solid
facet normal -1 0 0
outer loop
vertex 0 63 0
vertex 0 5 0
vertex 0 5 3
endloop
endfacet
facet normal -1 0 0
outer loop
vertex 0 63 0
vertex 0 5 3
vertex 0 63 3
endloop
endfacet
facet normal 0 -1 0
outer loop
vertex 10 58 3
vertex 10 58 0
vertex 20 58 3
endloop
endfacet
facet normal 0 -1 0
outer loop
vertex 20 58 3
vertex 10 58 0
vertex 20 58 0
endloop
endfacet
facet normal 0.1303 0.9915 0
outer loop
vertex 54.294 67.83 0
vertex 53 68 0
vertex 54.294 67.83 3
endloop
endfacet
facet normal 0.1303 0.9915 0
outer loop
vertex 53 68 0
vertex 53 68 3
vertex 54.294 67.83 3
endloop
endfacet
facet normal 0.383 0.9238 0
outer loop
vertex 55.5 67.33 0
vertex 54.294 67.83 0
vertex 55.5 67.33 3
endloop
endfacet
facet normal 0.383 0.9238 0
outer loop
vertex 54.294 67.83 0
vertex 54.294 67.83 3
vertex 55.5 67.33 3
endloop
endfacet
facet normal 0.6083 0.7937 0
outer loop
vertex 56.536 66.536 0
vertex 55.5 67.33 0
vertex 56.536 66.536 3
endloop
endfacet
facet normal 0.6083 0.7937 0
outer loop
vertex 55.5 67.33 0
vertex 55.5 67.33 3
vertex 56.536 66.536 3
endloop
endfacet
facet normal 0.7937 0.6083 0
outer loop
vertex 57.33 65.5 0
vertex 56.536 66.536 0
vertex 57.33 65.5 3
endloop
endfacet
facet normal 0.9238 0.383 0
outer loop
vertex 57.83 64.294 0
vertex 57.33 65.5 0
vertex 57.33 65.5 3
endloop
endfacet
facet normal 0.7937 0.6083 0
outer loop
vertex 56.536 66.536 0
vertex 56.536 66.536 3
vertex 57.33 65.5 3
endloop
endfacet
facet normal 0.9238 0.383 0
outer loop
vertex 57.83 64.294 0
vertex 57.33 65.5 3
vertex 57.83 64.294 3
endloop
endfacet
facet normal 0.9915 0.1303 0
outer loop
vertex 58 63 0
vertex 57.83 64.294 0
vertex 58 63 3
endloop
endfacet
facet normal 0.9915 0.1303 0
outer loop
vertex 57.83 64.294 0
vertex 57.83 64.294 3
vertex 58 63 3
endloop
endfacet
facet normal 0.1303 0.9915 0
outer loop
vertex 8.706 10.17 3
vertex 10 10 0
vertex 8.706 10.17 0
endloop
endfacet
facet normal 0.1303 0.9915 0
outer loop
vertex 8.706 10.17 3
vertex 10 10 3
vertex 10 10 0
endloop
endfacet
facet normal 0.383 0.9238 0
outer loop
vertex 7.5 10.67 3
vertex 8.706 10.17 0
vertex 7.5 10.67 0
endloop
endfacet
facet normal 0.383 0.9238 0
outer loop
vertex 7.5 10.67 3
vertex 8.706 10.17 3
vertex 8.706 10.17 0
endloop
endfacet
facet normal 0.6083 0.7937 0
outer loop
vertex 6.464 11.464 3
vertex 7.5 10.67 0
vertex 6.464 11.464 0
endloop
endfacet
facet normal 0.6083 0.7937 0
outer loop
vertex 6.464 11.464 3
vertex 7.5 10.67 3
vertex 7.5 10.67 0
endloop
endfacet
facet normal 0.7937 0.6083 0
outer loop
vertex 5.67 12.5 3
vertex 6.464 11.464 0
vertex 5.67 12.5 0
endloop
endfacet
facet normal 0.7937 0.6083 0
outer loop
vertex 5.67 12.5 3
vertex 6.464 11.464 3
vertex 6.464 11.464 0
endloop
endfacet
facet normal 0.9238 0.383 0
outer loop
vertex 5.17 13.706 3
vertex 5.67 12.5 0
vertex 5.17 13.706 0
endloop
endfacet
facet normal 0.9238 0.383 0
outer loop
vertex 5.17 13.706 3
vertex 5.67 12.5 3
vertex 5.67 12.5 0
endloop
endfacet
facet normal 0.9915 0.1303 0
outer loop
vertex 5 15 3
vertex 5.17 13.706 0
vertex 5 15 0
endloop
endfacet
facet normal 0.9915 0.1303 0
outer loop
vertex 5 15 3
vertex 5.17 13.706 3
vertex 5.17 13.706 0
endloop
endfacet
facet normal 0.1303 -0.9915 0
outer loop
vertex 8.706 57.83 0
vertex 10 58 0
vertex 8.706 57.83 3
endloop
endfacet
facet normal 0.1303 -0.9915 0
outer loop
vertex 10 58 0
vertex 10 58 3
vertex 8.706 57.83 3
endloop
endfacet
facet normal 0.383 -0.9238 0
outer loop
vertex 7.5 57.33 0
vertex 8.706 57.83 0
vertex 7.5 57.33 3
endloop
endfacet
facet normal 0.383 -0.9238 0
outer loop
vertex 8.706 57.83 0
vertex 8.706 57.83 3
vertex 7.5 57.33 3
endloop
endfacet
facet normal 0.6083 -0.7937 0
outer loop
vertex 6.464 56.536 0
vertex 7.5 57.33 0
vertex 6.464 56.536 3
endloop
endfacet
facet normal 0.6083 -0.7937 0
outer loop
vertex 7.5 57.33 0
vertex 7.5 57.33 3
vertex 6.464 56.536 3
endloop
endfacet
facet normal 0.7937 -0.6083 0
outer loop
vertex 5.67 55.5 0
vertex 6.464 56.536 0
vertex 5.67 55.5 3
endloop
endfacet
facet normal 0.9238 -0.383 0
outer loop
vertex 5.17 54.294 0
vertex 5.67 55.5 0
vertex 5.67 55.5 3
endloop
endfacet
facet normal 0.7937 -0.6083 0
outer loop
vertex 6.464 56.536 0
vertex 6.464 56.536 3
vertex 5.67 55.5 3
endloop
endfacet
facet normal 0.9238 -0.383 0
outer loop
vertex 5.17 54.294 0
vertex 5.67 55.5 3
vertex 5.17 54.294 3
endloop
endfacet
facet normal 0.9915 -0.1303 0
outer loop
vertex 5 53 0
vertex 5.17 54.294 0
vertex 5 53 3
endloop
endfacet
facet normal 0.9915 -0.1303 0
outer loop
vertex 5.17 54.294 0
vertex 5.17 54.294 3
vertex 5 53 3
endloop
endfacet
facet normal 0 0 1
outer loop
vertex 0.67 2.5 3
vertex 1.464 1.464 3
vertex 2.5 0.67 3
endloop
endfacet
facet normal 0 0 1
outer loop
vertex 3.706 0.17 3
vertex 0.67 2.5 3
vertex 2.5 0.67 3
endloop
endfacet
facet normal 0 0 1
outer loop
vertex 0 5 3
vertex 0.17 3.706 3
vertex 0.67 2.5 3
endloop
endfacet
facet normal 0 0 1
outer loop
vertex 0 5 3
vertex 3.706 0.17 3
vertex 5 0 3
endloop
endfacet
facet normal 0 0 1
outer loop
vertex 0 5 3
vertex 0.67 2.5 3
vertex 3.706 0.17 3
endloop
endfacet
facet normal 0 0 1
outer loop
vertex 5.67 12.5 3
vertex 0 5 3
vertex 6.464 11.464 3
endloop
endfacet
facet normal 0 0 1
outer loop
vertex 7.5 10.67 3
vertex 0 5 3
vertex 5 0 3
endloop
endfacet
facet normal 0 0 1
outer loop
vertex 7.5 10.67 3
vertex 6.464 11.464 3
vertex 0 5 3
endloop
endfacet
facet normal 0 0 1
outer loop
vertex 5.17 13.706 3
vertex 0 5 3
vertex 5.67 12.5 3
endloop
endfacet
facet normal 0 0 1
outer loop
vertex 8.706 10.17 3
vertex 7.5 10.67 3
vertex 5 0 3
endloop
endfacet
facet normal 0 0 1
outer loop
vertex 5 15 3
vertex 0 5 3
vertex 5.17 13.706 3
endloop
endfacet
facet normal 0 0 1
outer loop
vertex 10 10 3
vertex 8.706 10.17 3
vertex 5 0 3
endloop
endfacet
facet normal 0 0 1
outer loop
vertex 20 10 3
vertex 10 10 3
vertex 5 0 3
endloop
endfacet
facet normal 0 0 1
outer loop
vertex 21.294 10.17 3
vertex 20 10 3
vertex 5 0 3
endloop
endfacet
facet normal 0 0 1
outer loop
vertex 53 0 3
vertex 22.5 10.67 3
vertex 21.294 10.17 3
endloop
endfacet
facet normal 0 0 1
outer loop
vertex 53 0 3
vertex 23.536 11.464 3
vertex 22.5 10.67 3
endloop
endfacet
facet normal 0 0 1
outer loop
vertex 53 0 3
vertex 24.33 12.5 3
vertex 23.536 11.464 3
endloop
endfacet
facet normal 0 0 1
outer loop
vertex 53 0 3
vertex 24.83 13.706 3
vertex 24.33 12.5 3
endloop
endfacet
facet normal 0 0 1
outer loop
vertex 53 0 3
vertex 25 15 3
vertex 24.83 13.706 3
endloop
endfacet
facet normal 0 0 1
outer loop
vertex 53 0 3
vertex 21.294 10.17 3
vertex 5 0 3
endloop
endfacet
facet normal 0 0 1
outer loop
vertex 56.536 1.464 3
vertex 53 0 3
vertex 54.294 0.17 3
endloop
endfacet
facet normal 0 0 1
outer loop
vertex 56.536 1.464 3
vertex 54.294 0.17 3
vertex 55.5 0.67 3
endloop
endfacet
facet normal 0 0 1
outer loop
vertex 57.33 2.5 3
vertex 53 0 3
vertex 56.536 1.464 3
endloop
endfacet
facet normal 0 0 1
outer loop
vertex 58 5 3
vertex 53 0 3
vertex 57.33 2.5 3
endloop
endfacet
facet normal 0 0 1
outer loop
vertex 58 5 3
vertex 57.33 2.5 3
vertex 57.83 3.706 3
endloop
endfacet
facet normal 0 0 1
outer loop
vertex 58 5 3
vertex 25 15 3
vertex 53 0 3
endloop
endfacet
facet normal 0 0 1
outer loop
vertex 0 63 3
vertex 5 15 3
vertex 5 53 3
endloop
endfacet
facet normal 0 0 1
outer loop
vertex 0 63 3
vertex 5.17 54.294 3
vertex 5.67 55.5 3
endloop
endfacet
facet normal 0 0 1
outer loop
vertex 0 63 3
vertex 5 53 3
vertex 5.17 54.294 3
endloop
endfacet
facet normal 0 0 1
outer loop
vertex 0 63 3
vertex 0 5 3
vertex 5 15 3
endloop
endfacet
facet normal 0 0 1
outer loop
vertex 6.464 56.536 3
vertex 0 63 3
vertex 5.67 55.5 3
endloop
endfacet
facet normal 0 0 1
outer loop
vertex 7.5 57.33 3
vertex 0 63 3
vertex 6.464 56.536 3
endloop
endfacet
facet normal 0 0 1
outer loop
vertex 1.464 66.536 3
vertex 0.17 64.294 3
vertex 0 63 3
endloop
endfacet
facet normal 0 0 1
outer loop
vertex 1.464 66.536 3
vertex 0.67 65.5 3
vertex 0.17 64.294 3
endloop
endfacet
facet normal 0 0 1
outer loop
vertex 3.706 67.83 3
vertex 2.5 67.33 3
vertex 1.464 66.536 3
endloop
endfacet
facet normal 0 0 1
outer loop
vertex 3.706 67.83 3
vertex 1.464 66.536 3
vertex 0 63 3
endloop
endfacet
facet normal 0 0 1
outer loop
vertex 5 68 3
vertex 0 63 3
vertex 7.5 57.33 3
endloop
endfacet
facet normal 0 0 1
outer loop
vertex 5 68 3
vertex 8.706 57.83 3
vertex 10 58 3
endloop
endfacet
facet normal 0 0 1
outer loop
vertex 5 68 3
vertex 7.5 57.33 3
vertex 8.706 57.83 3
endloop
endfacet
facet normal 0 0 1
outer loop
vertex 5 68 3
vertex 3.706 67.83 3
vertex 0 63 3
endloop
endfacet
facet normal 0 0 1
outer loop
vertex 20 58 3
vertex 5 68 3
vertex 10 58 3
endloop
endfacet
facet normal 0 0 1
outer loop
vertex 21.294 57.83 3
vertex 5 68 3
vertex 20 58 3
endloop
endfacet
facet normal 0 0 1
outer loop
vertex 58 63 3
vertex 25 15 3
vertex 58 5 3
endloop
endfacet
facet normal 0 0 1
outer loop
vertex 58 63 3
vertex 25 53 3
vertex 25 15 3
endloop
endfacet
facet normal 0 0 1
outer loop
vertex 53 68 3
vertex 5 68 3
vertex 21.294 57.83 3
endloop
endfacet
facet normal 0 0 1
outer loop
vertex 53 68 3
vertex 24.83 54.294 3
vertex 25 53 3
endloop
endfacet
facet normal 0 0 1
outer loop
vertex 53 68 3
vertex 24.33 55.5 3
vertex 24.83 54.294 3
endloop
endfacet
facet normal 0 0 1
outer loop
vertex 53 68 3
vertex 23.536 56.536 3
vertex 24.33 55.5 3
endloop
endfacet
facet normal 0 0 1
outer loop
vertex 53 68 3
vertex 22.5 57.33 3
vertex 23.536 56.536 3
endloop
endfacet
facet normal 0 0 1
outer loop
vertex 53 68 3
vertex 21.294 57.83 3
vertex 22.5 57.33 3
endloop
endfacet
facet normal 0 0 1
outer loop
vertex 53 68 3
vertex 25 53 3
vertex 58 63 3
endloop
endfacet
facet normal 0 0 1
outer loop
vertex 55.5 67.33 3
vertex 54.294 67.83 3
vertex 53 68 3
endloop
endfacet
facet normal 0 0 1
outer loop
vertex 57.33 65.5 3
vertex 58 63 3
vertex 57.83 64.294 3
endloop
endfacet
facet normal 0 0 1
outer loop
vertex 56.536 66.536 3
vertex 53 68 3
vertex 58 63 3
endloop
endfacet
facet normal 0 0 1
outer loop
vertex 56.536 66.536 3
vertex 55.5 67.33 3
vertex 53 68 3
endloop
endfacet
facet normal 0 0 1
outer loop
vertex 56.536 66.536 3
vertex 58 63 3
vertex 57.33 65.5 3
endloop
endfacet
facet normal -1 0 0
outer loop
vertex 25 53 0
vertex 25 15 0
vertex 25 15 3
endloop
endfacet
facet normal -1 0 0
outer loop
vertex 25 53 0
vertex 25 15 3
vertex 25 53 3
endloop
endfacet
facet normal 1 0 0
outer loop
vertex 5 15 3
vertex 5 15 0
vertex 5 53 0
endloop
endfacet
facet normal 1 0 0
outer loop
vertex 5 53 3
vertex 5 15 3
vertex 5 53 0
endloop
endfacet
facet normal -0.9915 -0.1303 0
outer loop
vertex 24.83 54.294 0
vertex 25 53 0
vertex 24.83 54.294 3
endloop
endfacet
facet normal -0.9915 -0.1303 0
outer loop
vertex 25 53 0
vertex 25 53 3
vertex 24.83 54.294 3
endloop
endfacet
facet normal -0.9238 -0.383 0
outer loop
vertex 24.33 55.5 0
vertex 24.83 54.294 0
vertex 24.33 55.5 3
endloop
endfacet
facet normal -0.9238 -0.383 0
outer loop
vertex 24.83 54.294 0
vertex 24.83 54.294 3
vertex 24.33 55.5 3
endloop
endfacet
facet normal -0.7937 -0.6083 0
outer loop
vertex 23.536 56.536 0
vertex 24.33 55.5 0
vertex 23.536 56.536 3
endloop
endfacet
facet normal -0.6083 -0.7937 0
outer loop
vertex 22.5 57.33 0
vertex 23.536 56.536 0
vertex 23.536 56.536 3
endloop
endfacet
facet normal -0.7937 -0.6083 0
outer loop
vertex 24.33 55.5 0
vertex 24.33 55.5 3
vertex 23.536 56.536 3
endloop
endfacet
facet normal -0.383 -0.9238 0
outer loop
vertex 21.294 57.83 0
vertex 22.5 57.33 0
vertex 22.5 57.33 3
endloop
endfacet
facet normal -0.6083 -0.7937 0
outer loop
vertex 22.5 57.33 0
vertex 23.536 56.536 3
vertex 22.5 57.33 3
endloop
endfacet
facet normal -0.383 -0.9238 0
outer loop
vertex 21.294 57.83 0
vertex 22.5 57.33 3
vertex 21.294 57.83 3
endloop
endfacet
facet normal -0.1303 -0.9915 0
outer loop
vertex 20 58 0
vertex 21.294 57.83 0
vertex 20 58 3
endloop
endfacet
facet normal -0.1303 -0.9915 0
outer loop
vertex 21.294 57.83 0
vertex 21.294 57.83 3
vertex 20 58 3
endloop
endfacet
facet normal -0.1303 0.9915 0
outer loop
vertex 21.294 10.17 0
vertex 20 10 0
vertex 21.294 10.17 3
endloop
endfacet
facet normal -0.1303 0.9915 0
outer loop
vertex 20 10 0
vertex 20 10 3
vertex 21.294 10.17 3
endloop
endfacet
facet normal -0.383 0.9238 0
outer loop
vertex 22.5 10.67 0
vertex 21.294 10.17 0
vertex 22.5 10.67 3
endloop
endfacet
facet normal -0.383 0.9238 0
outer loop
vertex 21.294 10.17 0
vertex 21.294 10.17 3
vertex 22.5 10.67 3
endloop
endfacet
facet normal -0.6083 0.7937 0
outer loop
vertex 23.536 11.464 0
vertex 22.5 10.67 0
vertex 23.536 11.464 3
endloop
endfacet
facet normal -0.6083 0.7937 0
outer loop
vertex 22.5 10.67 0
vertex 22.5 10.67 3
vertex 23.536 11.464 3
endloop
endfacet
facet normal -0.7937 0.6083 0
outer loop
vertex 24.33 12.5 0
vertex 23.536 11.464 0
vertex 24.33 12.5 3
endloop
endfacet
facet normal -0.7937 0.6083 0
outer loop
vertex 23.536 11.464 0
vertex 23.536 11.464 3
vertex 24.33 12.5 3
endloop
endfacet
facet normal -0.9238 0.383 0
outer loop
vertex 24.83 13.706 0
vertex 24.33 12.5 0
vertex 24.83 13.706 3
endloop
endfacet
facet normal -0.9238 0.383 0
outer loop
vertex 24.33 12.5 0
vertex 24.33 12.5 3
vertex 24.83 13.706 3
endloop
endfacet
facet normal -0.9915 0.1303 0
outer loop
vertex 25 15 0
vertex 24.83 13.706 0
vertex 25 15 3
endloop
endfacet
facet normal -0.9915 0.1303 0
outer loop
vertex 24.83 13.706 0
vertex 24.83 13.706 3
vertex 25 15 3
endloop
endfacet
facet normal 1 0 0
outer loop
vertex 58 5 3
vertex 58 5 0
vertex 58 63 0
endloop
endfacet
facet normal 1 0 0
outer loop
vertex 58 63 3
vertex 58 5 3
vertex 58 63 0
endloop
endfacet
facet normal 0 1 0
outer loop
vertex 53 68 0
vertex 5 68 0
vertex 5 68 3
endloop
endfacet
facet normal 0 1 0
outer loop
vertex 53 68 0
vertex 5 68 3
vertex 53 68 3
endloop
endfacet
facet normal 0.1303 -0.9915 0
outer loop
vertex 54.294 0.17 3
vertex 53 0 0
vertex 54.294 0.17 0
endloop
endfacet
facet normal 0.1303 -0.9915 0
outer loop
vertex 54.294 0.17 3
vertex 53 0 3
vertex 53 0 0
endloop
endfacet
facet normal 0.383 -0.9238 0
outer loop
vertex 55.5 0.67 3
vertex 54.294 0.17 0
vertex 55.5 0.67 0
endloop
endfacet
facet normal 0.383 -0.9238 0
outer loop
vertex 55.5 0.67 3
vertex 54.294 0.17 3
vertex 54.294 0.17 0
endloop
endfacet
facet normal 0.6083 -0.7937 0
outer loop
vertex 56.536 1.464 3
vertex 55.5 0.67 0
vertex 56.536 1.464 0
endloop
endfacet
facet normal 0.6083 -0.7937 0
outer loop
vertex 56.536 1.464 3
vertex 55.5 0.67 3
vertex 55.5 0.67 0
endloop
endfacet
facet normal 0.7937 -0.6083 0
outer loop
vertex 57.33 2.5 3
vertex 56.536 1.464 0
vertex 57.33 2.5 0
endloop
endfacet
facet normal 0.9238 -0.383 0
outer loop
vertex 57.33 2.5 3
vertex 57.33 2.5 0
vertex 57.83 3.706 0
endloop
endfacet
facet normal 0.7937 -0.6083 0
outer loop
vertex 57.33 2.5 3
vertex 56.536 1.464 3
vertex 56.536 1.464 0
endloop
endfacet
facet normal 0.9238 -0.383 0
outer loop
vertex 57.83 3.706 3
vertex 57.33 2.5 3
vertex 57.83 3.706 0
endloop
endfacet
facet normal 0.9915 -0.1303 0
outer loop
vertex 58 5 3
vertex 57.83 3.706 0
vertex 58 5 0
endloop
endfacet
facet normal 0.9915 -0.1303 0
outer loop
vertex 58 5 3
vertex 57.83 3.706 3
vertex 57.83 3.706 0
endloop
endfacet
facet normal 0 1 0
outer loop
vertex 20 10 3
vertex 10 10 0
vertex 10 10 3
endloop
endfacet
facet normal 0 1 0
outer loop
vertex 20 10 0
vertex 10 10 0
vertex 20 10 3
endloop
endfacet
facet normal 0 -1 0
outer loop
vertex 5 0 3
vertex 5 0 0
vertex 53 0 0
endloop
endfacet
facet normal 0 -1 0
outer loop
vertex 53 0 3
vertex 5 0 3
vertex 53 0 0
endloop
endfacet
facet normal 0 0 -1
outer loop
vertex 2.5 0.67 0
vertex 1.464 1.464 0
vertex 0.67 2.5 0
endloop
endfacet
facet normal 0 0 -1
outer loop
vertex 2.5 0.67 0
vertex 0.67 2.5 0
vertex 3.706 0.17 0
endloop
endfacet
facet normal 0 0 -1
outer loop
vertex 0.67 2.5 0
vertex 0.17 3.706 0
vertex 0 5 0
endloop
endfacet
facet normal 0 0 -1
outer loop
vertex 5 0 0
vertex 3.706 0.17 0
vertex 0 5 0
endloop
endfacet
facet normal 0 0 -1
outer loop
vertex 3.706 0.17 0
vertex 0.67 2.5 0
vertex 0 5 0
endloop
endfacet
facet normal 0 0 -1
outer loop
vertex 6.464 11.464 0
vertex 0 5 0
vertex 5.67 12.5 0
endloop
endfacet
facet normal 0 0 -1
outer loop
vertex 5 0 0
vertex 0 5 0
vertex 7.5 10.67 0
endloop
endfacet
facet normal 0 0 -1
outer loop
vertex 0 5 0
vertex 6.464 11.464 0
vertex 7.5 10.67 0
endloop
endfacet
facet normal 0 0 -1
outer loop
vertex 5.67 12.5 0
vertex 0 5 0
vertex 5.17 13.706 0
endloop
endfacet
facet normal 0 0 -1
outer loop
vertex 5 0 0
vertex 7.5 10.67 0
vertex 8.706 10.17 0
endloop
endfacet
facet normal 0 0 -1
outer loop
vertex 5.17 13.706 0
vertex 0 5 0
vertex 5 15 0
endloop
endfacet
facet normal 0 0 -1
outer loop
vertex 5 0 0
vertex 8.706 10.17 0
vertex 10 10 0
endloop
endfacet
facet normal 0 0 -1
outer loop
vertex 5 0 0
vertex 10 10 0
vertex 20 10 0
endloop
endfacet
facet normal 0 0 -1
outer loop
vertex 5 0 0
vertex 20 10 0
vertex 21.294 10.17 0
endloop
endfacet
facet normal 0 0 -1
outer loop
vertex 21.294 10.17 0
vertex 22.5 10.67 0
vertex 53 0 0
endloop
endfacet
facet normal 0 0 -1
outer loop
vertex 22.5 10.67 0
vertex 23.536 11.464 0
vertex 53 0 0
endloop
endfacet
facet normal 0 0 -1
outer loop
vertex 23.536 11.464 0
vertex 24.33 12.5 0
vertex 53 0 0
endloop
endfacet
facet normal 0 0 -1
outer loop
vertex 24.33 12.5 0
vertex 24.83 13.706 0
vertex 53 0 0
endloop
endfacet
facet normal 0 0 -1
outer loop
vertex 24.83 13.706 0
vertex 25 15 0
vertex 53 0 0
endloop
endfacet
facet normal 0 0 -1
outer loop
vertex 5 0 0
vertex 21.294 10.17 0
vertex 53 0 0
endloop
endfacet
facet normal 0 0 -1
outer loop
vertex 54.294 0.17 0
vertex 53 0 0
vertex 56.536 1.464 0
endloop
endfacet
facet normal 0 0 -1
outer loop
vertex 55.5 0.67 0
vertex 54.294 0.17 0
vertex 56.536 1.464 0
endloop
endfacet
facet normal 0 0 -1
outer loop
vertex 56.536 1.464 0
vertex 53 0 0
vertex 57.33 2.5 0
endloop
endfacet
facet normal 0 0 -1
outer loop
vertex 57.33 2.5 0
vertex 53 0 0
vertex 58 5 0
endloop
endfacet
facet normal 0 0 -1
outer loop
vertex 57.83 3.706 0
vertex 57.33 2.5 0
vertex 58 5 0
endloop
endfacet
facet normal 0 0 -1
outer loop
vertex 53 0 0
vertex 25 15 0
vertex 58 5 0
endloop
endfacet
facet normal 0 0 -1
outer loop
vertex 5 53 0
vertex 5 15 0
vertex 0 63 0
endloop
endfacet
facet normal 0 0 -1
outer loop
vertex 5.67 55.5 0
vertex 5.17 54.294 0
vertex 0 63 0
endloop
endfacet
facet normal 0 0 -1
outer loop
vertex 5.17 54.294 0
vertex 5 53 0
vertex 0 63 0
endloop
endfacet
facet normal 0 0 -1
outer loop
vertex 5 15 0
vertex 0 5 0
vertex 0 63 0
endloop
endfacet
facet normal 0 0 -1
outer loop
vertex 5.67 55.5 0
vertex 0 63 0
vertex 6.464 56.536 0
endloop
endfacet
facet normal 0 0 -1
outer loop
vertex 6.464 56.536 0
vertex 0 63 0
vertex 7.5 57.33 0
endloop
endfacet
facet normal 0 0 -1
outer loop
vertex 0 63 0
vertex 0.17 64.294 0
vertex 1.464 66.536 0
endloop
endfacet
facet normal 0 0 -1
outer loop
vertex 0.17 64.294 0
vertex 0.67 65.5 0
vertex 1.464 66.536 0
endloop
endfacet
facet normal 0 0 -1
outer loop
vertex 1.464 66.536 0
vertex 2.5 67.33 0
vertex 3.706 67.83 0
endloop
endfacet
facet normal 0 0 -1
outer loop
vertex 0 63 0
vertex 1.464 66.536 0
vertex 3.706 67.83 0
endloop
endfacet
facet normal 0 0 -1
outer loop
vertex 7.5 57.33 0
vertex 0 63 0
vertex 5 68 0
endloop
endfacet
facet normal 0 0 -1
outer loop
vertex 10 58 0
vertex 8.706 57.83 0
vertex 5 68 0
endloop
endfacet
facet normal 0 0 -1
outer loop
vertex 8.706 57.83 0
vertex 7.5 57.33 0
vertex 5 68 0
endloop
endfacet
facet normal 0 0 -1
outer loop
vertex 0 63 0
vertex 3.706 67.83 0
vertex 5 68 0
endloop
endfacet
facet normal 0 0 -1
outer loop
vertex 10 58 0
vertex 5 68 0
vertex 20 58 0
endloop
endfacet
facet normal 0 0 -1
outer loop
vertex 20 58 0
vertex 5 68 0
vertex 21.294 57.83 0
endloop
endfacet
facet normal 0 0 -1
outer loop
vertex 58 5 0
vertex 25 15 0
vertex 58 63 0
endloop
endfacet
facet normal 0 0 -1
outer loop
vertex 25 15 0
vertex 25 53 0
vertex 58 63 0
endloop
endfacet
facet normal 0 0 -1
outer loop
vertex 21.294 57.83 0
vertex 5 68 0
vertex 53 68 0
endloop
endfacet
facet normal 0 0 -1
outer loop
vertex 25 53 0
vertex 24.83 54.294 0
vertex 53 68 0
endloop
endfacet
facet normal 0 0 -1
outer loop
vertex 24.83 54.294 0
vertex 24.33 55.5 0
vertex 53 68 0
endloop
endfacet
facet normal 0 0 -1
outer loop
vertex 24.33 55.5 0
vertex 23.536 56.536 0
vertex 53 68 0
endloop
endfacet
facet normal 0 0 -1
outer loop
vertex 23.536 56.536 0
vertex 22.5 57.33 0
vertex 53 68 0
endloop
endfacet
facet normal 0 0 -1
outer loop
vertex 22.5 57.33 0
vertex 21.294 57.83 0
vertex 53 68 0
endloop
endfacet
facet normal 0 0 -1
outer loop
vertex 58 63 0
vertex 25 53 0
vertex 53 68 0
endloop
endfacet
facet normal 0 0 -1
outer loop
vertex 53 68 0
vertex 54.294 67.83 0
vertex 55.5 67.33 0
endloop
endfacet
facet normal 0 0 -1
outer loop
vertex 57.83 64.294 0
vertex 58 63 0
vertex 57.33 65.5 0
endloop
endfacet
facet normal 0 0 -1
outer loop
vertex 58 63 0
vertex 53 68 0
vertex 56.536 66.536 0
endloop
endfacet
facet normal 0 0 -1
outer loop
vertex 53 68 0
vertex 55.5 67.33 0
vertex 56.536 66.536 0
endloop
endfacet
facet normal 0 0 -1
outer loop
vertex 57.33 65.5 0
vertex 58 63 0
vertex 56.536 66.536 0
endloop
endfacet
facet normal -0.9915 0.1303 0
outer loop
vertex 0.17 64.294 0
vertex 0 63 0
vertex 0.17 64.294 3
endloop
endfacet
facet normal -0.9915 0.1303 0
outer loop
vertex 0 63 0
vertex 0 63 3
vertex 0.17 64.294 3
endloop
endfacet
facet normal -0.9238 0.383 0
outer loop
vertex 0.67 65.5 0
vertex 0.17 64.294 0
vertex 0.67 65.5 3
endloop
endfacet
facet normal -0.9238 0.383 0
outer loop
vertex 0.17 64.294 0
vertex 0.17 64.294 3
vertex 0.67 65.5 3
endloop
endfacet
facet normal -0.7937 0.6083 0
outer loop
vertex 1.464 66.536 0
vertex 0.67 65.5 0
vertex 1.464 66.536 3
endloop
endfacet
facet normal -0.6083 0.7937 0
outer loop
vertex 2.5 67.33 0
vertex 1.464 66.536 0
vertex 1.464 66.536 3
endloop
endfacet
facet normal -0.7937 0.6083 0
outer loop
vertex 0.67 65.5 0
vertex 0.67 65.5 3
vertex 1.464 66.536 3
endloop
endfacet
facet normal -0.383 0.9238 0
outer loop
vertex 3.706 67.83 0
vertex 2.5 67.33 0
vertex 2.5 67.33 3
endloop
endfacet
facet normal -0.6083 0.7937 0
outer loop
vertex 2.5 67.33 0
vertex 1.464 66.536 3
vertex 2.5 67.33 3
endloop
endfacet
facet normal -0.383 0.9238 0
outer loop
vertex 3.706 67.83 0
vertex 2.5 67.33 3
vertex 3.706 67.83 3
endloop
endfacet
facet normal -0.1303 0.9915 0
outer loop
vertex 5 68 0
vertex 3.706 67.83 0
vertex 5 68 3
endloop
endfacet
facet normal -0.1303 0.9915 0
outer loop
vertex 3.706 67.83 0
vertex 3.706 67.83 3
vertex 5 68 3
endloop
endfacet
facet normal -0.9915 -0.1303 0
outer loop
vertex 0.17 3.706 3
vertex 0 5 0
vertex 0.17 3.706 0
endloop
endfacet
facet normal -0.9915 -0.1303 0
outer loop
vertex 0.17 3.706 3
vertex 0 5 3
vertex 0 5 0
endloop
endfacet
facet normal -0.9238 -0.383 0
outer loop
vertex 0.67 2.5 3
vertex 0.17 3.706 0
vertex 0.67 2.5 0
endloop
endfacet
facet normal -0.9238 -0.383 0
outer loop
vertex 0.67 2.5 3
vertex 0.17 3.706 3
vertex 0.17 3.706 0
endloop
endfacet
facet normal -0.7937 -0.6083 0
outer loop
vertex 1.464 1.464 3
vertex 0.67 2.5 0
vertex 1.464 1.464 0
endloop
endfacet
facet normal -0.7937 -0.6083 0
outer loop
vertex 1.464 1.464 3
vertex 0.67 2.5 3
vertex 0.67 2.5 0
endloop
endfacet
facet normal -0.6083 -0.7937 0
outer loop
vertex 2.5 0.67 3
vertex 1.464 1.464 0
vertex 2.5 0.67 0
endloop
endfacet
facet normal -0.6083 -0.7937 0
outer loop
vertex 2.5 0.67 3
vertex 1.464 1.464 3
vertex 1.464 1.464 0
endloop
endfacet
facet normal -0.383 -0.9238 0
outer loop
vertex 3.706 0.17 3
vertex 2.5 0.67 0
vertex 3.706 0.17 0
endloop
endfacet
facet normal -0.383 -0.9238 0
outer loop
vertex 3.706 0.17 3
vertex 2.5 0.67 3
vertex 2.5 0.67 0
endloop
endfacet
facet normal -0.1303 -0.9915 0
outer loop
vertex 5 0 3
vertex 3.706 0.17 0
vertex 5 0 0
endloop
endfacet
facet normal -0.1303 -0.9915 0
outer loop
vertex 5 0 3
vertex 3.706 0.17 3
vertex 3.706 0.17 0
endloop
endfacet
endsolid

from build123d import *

# Parameters (mm, degrees)
SKETCH1_W           = 58
SKETCH1_H           = 68
SKETCH1_W_2         = 20
SKETCH1_H_2         = 48
BOSS_EXTRUDE1_DEPTH = 3
FILLET2_R           = 5
FILLET3_R           = 5


with BuildPart() as part:
    # Sketch1 → Boss-Extrude1 (new body)
    with BuildSketch(Plane.XY):
        with Locations((29, 34)):
            Rectangle(SKETCH1_W, SKETCH1_H)
        with Locations((15, 34)):
            Rectangle(SKETCH1_W_2, SKETCH1_H_2, mode=Mode.SUBTRACT)
    extrude(amount=BOSS_EXTRUDE1_DEPTH)

    # Fillet2
    fillet2_edges = [part.edges().sort_by_distance(p)[0] for p in [
        (0, 68, 1.5),
        (58, 68, 1.5),
        (58, 0, 1.5),
        (0, 0, 1.5),
    ]]
    fillet(fillet2_edges, radius=FILLET2_R)

    # Fillet3
    fillet3_edges = [part.edges().sort_by_distance(p)[0] for p in [
        (5, 58, 1.5),
        (5, 10, 1.5),
        (25, 10, 1.5),
        (25, 58, 1.5),
    ]]
    fillet(fillet3_edges, radius=FILLET3_R)


solid = part.part
